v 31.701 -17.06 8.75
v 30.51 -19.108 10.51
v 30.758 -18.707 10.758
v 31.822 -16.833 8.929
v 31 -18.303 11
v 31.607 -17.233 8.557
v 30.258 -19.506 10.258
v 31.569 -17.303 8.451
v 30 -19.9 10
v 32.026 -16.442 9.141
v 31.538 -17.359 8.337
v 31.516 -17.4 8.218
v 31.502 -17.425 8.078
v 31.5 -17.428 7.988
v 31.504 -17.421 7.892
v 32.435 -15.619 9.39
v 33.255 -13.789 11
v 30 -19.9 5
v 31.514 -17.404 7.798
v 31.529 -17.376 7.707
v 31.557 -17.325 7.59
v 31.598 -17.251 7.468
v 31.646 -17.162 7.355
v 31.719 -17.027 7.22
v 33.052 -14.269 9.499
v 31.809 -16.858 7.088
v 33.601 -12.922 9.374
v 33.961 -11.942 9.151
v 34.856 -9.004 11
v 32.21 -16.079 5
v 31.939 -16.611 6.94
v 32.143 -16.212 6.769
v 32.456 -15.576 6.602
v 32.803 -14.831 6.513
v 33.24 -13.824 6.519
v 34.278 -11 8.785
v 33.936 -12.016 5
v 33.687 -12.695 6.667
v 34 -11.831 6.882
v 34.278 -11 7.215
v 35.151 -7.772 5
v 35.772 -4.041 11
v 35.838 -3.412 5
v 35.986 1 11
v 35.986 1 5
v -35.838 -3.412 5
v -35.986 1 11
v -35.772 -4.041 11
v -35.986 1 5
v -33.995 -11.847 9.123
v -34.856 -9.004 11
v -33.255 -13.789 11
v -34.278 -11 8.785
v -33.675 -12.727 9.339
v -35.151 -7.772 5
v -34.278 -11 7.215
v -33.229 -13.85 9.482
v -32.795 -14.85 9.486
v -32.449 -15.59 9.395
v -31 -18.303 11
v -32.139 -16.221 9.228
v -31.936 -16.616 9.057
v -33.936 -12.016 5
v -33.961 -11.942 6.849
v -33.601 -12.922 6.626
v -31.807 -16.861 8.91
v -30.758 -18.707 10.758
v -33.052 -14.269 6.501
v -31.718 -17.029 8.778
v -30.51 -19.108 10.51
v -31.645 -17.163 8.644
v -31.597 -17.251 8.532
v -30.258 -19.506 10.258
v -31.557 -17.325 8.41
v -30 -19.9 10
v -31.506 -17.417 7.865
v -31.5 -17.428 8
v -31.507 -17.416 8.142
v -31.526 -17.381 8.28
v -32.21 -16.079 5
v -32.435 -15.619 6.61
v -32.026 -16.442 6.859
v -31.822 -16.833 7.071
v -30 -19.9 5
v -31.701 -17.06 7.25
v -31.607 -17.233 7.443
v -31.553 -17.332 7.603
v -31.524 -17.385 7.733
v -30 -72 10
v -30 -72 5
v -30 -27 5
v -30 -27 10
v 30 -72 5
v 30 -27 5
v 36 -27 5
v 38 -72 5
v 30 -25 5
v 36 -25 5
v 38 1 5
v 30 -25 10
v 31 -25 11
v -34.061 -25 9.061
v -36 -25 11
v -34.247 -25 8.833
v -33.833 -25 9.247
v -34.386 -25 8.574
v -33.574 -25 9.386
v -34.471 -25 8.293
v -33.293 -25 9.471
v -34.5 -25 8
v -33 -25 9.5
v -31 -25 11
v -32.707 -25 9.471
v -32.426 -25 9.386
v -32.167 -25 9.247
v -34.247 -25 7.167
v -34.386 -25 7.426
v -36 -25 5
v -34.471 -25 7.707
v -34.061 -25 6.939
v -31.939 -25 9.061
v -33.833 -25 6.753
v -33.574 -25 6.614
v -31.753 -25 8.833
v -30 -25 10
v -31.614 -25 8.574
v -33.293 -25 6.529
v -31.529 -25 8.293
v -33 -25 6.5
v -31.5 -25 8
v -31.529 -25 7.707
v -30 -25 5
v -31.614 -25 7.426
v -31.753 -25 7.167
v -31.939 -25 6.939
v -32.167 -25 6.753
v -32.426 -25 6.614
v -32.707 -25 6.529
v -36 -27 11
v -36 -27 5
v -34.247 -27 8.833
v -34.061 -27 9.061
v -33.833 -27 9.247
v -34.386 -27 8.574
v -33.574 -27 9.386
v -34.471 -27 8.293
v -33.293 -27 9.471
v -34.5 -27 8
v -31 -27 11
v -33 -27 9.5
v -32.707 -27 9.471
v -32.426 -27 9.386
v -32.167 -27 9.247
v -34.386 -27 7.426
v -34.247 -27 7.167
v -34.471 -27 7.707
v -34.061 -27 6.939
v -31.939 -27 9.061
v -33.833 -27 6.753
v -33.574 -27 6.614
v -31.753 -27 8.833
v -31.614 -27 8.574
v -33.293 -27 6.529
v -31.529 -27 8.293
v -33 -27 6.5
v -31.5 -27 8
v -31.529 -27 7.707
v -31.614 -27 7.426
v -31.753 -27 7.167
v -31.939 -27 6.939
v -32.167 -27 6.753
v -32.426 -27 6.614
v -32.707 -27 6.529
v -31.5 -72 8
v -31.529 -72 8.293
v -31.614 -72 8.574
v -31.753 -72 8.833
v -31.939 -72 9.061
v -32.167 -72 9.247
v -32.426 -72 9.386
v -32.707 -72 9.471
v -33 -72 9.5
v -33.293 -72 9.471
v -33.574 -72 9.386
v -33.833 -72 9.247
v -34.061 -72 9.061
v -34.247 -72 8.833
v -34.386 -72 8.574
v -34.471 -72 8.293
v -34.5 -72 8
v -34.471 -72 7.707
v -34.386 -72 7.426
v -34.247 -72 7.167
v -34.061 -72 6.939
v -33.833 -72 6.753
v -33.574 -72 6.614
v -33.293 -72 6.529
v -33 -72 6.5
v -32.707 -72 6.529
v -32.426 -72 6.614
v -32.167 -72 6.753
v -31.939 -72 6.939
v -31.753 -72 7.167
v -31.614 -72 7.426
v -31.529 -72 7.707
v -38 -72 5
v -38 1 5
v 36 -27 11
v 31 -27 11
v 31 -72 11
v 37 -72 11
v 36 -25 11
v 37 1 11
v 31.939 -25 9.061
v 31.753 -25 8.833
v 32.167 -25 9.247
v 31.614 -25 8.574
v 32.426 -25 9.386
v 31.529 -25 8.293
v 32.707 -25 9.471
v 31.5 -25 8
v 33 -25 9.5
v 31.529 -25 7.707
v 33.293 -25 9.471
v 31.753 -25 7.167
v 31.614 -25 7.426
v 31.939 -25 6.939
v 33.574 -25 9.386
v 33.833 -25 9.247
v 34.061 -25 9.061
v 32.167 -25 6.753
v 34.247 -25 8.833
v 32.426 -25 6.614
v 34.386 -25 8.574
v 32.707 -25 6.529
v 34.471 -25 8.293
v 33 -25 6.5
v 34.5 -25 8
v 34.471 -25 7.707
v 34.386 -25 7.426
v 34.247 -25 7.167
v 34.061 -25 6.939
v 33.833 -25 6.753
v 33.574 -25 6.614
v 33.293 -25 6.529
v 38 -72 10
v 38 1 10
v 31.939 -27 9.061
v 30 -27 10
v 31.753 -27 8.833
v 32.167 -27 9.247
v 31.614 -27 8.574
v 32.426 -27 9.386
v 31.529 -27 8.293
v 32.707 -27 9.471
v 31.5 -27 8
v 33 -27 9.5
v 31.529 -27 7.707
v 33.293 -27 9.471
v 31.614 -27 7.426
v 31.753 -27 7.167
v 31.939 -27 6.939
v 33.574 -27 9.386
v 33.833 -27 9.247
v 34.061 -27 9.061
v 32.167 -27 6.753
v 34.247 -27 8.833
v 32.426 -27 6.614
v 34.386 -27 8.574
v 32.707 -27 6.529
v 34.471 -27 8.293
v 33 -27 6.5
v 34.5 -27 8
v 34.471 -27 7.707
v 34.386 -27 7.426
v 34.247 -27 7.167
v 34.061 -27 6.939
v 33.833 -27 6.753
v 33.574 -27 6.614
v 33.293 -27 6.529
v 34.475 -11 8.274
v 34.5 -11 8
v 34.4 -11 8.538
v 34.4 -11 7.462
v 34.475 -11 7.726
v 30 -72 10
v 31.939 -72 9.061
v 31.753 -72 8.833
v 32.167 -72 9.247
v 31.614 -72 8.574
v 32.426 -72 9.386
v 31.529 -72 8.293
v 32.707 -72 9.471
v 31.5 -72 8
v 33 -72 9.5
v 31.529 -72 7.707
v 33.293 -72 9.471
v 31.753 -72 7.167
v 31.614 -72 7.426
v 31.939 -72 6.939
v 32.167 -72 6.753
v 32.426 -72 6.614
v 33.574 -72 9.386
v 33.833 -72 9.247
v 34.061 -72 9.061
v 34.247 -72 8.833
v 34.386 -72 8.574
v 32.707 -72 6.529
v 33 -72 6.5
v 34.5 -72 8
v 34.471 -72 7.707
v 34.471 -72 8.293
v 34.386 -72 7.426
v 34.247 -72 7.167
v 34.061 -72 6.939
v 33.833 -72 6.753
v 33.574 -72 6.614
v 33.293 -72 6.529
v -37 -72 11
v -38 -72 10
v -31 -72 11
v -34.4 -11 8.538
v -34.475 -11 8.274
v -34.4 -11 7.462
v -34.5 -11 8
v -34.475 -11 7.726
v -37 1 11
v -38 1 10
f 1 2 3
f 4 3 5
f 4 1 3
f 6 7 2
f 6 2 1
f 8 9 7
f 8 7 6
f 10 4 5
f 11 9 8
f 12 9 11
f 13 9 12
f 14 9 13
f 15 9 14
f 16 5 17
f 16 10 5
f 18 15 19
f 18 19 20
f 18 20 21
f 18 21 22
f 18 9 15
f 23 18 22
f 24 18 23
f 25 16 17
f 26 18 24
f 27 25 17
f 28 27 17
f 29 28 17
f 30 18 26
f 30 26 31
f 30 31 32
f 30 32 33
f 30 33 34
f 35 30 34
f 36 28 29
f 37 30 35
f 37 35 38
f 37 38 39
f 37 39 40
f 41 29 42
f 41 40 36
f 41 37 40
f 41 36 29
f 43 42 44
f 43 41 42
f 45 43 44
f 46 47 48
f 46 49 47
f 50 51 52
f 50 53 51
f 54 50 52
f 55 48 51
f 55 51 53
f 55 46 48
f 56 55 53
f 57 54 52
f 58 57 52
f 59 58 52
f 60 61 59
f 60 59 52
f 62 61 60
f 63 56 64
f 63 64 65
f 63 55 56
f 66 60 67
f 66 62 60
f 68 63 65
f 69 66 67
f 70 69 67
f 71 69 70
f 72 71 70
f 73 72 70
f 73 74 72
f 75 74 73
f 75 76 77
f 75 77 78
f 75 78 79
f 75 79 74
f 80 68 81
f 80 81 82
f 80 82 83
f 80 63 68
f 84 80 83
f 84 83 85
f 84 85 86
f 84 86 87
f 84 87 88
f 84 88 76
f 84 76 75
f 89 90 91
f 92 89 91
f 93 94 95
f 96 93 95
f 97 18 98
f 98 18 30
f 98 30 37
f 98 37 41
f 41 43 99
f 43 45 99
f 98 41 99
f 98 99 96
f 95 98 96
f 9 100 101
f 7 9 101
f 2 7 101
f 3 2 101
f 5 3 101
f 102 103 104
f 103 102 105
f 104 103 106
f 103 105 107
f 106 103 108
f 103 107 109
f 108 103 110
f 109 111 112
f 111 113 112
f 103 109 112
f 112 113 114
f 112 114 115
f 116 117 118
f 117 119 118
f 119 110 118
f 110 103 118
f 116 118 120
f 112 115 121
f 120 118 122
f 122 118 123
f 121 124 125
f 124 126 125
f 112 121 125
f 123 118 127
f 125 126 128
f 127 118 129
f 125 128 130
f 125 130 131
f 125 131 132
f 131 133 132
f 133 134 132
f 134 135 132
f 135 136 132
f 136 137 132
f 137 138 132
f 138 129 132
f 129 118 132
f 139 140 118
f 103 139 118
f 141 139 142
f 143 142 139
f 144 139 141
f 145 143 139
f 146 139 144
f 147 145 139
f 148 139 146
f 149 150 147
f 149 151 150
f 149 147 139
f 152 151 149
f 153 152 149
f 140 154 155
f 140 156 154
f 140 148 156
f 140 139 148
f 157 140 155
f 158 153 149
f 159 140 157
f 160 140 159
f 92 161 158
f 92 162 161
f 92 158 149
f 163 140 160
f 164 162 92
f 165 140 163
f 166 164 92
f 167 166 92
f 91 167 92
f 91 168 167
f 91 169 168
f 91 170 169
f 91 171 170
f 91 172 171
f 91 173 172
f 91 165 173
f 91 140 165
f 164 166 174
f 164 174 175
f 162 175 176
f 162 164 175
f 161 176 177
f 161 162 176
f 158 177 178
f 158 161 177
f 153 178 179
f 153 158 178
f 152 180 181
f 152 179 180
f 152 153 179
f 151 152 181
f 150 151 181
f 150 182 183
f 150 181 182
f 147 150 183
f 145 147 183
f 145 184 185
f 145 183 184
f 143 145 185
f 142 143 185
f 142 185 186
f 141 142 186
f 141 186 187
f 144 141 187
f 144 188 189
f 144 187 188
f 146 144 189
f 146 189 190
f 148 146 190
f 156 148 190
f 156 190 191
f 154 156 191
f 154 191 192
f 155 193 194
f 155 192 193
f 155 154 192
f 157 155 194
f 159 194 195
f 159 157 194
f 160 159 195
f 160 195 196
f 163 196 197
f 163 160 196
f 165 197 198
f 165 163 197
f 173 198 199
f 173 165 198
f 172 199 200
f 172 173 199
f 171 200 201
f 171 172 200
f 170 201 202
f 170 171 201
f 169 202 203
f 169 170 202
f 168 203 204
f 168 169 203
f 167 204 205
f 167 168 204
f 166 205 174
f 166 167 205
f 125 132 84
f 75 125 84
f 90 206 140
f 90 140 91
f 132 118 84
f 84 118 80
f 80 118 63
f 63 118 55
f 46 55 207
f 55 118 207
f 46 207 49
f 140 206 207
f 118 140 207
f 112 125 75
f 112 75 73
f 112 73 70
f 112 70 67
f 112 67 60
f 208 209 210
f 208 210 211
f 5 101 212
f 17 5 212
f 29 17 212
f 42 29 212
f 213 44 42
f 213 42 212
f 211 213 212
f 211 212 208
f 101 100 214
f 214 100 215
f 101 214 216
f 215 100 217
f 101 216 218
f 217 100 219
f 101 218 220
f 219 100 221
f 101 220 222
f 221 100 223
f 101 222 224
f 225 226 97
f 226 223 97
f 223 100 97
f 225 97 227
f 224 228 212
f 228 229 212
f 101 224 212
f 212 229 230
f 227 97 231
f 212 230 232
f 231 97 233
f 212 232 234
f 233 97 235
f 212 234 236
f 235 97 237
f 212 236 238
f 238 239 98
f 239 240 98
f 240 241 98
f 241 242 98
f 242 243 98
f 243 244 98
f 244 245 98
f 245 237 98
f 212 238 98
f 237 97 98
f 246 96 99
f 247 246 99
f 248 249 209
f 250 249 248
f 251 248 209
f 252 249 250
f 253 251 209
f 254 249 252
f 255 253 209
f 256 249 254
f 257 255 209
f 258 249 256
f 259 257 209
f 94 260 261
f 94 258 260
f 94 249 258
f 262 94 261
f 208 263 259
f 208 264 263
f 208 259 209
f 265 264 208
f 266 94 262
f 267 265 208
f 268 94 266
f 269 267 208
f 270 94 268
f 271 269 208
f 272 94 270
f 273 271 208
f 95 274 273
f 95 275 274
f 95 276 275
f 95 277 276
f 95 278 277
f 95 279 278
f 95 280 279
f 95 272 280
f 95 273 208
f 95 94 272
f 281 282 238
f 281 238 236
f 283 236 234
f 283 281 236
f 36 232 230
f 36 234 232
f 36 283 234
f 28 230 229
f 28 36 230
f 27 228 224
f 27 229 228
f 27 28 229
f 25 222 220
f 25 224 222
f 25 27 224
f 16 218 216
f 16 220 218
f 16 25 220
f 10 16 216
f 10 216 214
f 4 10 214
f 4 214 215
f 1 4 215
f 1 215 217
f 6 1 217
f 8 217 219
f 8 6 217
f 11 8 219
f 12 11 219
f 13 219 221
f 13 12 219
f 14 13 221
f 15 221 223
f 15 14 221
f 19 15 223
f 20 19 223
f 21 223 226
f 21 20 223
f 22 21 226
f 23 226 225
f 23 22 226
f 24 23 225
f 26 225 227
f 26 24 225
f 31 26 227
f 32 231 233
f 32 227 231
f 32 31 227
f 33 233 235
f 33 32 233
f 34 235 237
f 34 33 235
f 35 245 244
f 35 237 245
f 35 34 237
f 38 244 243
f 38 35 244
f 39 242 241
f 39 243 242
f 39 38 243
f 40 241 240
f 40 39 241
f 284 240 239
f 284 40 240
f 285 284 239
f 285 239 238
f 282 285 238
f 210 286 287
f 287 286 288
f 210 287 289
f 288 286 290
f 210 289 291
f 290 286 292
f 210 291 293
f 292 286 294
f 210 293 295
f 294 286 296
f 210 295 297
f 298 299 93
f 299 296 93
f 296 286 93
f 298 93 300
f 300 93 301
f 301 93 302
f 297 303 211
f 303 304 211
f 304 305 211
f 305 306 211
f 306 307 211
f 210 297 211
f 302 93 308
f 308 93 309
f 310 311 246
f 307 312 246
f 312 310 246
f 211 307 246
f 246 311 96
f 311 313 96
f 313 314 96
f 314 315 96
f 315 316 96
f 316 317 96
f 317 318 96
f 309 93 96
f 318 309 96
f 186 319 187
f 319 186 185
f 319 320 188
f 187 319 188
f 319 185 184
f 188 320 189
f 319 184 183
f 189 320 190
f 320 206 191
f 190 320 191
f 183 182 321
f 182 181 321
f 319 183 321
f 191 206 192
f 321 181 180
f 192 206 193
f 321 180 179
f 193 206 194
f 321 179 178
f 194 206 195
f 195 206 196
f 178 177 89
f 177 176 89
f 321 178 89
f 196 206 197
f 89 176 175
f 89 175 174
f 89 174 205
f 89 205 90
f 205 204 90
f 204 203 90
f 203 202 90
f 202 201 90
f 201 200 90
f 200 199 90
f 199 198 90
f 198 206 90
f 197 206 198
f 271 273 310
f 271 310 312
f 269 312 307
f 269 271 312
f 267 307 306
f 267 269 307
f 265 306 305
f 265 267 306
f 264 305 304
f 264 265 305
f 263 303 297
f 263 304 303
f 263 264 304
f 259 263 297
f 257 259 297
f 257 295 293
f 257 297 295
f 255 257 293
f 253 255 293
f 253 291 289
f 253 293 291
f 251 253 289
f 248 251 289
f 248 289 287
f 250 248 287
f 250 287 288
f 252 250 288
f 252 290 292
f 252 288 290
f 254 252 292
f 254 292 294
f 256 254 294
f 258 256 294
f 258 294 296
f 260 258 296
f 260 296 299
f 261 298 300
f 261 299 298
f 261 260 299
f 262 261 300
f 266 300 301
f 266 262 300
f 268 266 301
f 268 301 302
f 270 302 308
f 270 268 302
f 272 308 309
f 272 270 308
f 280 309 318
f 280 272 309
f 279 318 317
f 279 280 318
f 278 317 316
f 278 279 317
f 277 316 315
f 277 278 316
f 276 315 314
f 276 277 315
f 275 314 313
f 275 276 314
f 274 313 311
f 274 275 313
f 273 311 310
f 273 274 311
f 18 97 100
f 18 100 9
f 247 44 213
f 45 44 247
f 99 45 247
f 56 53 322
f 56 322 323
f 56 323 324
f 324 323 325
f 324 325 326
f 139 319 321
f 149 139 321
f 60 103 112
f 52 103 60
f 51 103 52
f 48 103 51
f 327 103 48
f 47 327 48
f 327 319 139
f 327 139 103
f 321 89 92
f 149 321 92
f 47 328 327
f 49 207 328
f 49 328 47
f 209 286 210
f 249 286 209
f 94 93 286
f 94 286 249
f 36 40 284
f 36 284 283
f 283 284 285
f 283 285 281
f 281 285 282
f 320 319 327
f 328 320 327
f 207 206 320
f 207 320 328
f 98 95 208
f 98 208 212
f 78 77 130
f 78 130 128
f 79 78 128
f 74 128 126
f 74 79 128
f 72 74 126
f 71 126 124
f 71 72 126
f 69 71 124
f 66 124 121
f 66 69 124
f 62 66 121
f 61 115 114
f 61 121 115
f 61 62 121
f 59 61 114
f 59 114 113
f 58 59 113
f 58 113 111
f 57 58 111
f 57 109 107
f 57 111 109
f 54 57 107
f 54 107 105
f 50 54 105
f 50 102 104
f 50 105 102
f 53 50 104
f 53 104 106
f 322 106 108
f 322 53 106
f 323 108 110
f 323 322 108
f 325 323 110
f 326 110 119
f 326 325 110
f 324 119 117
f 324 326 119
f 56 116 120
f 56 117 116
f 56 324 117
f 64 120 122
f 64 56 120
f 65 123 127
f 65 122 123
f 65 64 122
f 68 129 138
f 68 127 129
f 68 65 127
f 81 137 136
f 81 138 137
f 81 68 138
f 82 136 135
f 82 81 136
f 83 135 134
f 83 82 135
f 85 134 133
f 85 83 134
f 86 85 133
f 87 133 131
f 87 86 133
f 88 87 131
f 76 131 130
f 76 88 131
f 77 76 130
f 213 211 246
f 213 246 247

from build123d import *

# Parameters (mm, degrees)
CYLINDER2684_R     = 1.5
CYLINDER2684_DEPTH = 100
CYLINDER2683_R     = 1.5
CYLINDER2683_DEPTH = 100
BOX916_W           = 6
BOX916_H           = 2
BOX916_DEPTH       = 6
BOX_W              = 6
BOX_H              = 2
BOX_DEPTH          = 6
BOX883_W           = 15
BOX883_H           = 13.5
BOX883_DEPTH       = 32
BOX884_W           = 15
BOX884_H           = 13.5
BOX884_DEPTH       = 32
CYLINDER2672_R     = 36
CYLINDER2672_DEPTH = 16
BOX908_W           = 8
BOX908_H           = 80
BOX908_DEPTH       = 6
CHAMFER132_SIZE    = 1
CHAMFER139_SIZE    = 1
CYLINDER2674_R     = 36
CYLINDER2674_DEPTH = 16
BOX909_W           = 8
BOX909_H           = 80
BOX909_DEPTH       = 6
CHAMFER133_SIZE    = 1
CHAMFER135_SIZE    = 1


with BuildPart() as v_lec2654:
    # Cylinder2684 → Cylinder2684 (new body)
    with BuildSketch(Plane(origin=(33, -10, 8), x_dir=(1, 0, 0), z_dir=(0, -1, 0))):
        Circle(CYLINDER2684_R)
    extrude(amount=CYLINDER2684_DEPTH)


with BuildPart() as compound1194:
    # Cylinder2683 → Cylinder2683 (new body)
    with BuildSketch(Plane(origin=(-33, -10, 8), x_dir=(1, 0, 0), z_dir=(0, -1, 0))):
        Circle(CYLINDER2683_R)
    extrude(amount=CYLINDER2683_DEPTH)

    # Compound1194: union Válec2654
    add(v_lec2654.part)


with BuildPart() as compound1194_1:
    # Compound1194 placement: moved
    add(compound1194.part.moved(Location((0, -1, 0))))


with BuildPart() as krychle915:
    # Box916 → Box916 (new body)
    with BuildSketch(Plane(origin=(-36, -27, 5), x_dir=(1, 0, 0), z_dir=(0, 0, 1))):
        with Locations((3, 1)):
            Rectangle(BOX916_W, BOX916_H)
    extrude(amount=BOX916_DEPTH)


with BuildPart() as compound1191:
    # Box → Box (new body)
    with BuildSketch(Plane(origin=(30, -27, 5), x_dir=(1, 0, 0), z_dir=(0, 0, 1))):
        with Locations((3, 1)):
            Rectangle(BOX_W, BOX_H)
    extrude(amount=BOX_DEPTH)

    # Compound1191: union Krychle915
    add(krychle915.part)


with BuildPart() as krychle882:
    # Box883 → Box883 (new body)
    with BuildSketch(Plane(origin=(-38, -68, 5), x_dir=(1, 0, 0), z_dir=(0, 0, 1))):
        with Locations((7.5, 6.75)):
            Rectangle(BOX883_W, BOX883_H)
    extrude(amount=BOX883_DEPTH)


with BuildPart() as compound:
    # Box884 → Box884 (new body)
    with BuildSketch(Plane(origin=(23, -68, 5), x_dir=(1, 0, 0), z_dir=(0, 0, 1))):
        with Locations((7.5, 6.75)):
            Rectangle(BOX884_W, BOX884_H)
    extrude(amount=BOX884_DEPTH)

    # Compound: union Krychle882
    add(krychle882.part)


with BuildPart() as compound_1:
    # Compound placement: moved
    add(compound.part.moved(Location((0, -17.5, 0))))


with BuildPart() as v_lec2642:
    # Cylinder2672 → Cylinder2672 (new body)
    with BuildSketch(Plane.XY):
        Circle(CYLINDER2672_R)
    extrude(amount=CYLINDER2672_DEPTH)


with BuildPart() as cut994:
    # Box908 → Box908 (new body)
    with BuildSketch(Plane(origin=(-38, -79, 5), x_dir=(1, 0, 0), z_dir=(0, 0, 1))):
        with Locations((4, 40)):
            Rectangle(BOX908_W, BOX908_H)
    extrude(amount=BOX908_DEPTH)

    # Chamfer132
    chamfer132_edges = [cut994.edges().sort_by_distance(p)[0] for p in [
        (-38, -39, 11),
    ]]
    chamfer(chamfer132_edges, length=CHAMFER132_SIZE)

    # Chamfer139
    chamfer139_edges = [cut994.edges().sort_by_distance(p)[0] for p in [
        (-30, -39, 11),
    ]]
    chamfer(chamfer139_edges, length=CHAMFER139_SIZE)

    # Cut994: cut Válec2642
    add(v_lec2642.part, mode=Mode.SUBTRACT)


with BuildPart() as v_lec2644:
    # Cylinder2674 → Cylinder2674 (new body)
    with BuildSketch(Plane.XY):
        Circle(CYLINDER2674_R)
    extrude(amount=CYLINDER2674_DEPTH)


with BuildPart() as cut1005:
    # Box909 → Box909 (new body)
    with BuildSketch(Plane(origin=(30, -79, 5), x_dir=(1, 0, 0), z_dir=(0, 0, 1))):
        with Locations((4, 40)):
            Rectangle(BOX909_W, BOX909_H)
    extrude(amount=BOX909_DEPTH)

    # Chamfer133
    chamfer133_edges = [cut1005.edges().sort_by_distance(p)[0] for p in [
        (38, -39, 11),
    ]]
    chamfer(chamfer133_edges, length=CHAMFER133_SIZE)

    # Chamfer135
    chamfer135_edges = [cut1005.edges().sort_by_distance(p)[0] for p in [
        (30, -39, 11),
    ]]
    chamfer(chamfer135_edges, length=CHAMFER135_SIZE)

    # Cut996: cut Válec2644
    add(v_lec2644.part, mode=Mode.SUBTRACT)

    # Compound1185: union Cut994
    add(cut994.part)

    # Cut1002: cut Compound
    add(compound_1.part, mode=Mode.SUBTRACT)

    # Cut1003: cut Compound1191
    add(compound1191.part, mode=Mode.SUBTRACT)

    # Cut1005: cut Compound1194
    add(compound1194_1.part, mode=Mode.SUBTRACT)


solid = cut1005.part
